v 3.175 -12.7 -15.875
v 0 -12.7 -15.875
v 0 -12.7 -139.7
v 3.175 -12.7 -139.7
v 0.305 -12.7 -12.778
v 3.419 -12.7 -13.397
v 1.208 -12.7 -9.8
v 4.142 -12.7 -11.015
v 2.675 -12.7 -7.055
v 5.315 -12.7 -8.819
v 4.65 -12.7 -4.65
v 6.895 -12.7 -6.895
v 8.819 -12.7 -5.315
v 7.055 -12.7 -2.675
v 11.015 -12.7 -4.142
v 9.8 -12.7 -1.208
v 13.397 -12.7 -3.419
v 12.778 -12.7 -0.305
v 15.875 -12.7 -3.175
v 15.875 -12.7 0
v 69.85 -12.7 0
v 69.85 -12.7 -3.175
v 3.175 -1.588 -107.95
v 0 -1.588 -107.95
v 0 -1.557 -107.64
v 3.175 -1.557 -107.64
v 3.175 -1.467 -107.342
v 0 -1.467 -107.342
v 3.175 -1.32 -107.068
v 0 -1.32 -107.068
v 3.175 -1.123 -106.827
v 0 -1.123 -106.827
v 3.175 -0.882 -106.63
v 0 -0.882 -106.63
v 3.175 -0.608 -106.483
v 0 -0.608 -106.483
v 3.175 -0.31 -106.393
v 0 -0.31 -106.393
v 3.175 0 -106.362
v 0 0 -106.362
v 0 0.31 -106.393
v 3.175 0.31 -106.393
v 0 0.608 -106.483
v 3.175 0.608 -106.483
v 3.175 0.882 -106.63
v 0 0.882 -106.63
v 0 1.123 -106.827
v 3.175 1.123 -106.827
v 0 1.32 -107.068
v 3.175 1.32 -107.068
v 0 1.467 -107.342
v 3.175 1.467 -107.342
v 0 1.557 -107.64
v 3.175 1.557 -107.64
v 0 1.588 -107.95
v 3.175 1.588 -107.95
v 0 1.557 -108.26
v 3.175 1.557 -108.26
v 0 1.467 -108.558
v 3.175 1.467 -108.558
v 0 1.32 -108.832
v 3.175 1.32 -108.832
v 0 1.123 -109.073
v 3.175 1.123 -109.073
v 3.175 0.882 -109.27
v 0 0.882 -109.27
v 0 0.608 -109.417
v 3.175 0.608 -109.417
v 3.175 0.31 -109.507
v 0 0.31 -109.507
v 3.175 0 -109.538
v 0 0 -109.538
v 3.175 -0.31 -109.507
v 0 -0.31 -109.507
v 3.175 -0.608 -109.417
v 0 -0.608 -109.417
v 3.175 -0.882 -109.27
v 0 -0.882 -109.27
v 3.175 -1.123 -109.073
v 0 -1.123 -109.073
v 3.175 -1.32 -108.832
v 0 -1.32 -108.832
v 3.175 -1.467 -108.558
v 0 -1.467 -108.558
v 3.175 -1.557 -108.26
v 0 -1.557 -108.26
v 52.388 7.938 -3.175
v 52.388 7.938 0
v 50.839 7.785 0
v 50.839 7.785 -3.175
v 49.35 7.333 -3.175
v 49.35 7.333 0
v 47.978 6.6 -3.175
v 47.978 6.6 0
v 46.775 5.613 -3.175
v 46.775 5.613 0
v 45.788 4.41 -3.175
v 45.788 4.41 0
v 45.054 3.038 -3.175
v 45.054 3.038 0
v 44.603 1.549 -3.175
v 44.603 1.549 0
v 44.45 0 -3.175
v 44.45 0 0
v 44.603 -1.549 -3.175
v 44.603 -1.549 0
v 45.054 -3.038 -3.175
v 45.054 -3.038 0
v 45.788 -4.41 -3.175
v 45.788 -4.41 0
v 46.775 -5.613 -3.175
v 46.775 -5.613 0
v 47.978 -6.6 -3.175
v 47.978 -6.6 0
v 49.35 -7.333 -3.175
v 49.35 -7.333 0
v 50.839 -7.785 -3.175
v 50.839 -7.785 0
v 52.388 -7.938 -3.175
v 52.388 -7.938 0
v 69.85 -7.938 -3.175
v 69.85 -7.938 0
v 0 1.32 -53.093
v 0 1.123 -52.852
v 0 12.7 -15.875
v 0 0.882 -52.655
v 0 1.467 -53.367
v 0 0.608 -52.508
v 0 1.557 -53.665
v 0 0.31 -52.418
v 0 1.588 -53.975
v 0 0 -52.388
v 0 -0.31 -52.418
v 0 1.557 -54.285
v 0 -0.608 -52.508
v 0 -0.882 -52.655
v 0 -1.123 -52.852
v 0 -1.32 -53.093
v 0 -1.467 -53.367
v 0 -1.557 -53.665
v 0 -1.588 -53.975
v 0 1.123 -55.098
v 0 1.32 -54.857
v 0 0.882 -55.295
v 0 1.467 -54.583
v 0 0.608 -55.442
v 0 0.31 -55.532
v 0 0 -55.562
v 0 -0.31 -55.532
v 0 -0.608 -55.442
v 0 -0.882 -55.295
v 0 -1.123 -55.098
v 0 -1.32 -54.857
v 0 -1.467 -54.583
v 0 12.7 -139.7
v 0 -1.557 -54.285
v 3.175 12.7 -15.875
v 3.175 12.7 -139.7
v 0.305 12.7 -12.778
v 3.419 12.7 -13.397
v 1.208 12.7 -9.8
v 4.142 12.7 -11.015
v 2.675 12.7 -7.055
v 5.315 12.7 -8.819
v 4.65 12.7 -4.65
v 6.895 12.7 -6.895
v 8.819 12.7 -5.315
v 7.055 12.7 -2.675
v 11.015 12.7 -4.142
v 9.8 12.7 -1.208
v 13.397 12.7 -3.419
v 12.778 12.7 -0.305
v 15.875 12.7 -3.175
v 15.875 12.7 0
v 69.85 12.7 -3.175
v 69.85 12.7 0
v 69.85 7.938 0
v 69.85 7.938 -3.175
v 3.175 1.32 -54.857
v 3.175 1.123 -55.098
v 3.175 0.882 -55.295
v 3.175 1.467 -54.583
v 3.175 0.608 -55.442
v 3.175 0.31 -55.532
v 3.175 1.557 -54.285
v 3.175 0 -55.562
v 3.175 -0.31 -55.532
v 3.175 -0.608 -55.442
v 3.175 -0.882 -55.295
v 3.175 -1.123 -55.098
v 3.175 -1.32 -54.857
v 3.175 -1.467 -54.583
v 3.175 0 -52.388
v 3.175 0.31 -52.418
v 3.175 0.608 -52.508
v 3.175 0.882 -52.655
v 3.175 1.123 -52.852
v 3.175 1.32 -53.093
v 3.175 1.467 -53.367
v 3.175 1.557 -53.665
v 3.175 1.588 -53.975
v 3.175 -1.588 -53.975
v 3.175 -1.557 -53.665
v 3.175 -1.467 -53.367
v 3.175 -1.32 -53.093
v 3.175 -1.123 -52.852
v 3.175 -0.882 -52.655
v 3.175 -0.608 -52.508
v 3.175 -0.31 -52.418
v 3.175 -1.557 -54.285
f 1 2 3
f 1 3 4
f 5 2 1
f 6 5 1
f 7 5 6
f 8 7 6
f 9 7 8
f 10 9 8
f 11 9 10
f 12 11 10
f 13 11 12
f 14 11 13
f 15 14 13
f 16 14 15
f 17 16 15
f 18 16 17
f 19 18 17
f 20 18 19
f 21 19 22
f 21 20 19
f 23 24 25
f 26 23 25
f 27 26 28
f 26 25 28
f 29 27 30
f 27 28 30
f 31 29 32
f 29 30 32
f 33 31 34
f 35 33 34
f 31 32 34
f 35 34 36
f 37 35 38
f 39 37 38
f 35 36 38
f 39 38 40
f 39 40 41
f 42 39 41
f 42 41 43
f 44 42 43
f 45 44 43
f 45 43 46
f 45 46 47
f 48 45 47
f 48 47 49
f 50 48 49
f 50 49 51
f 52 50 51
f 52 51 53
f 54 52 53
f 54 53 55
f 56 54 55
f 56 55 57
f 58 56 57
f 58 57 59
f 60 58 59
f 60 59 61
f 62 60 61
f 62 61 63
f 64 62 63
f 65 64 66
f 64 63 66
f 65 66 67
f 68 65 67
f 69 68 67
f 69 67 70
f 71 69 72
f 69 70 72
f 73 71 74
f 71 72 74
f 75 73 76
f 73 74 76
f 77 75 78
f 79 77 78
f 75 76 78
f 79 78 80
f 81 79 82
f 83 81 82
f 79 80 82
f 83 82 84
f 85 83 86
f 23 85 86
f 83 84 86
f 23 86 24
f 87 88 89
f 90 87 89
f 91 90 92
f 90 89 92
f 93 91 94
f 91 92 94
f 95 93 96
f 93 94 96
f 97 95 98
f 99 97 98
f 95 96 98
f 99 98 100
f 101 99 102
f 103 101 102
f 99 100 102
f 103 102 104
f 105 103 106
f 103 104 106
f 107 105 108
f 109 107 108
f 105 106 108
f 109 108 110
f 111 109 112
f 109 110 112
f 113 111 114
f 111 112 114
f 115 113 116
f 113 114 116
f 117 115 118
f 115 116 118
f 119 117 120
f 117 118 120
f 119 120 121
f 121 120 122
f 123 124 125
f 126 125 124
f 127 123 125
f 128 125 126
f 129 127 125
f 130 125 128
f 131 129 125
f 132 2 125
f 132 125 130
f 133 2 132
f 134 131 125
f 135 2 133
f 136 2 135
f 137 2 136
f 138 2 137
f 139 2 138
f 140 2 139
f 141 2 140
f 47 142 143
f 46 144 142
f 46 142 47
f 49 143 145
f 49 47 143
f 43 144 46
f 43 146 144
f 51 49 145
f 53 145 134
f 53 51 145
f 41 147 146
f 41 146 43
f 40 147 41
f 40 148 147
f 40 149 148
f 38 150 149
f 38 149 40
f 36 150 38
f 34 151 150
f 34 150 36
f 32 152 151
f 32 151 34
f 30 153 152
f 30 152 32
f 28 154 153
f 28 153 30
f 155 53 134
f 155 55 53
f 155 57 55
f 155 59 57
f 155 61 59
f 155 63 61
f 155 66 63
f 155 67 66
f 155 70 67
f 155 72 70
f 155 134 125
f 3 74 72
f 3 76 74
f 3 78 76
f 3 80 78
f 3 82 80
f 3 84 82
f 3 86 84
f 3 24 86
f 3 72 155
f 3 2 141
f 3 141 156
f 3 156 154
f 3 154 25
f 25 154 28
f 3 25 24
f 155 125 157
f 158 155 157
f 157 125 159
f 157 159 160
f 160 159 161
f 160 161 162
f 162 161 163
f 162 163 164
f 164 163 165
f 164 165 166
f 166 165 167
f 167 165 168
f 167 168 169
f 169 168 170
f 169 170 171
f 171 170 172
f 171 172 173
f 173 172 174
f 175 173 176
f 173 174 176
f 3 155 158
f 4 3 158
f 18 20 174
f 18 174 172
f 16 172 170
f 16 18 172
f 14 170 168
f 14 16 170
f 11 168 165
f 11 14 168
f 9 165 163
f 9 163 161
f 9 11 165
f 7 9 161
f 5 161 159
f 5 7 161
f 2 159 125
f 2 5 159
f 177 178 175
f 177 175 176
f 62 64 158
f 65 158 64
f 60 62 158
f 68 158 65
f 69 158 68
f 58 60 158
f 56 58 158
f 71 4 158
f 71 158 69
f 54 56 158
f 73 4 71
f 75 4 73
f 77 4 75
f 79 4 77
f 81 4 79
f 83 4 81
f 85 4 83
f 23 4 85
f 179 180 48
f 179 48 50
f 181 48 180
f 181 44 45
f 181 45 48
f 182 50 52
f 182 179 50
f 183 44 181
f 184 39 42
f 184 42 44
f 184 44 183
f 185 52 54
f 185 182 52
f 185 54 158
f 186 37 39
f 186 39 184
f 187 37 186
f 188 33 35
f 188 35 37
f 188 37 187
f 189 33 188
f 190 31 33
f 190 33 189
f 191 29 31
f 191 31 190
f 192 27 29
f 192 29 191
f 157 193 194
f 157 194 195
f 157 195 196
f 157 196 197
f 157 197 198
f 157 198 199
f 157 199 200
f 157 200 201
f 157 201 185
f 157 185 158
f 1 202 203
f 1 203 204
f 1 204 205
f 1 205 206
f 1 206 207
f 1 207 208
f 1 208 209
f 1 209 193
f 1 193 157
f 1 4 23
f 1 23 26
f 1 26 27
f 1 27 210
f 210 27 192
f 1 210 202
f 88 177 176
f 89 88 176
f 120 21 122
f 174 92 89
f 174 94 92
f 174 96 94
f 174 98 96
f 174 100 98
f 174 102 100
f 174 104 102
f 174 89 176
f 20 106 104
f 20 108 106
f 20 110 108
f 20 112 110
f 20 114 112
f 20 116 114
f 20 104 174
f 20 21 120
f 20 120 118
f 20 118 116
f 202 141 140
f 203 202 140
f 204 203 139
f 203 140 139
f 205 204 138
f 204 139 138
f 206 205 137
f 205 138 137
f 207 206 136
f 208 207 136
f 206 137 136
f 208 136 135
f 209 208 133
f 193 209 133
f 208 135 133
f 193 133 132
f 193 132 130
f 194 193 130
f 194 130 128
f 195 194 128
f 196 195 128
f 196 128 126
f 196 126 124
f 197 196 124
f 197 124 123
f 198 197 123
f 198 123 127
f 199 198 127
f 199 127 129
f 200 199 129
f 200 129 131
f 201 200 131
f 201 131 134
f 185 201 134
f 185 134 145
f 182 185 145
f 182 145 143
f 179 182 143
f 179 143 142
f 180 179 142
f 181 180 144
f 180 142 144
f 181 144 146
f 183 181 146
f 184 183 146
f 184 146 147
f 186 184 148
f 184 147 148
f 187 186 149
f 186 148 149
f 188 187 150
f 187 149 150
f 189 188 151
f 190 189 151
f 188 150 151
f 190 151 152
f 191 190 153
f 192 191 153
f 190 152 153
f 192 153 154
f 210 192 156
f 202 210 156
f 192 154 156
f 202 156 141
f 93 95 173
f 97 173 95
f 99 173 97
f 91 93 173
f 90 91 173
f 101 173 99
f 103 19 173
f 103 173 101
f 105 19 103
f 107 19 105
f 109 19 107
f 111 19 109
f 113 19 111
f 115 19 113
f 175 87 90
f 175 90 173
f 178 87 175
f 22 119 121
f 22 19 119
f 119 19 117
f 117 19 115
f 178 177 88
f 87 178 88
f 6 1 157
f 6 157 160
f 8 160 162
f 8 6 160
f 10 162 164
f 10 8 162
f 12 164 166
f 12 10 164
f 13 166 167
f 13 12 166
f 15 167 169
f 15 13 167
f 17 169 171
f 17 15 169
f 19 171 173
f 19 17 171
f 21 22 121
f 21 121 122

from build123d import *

# Parameters (mm, degrees)
F1_DEPTH = 12.7
F3_DEPTH = 25.4
F4_R     = 1.5875
F5_DEPTH = 25.4


with BuildPart() as f1:
    # F0 (on Front) → F1 (new body, symmetric)
    with BuildSketch(Plane.XZ):
        with BuildLine():
            Line((69.85, 0), (15.875, 0))
            ThreePointArc((15.875, 0), (4.64968, -4.64968), (0, -15.875))
            Line((0, -15.875), (0, -139.7))
            Line((0, -139.7), (3.175, -139.7))
            Line((3.175, -139.7), (3.175, -15.875))
            ThreePointArc((3.175, -15.875), (6.894744, -6.894744), (15.875, -3.175))
            Line((15.875, -3.175), (69.85, -3.175))
            Line((69.85, -3.175), (69.85, 0))
        make_face()
    extrude(amount=F1_DEPTH, both=True)

    # F2 (on face) → F3 (cut)
    with BuildSketch(Plane.XY):
        with BuildLine():
            ThreePointArc((52.3875, -7.9375), (58.00016, -5.61266), (60.325, 0))
            ThreePointArc((60.325, 0), (58.00016, 5.61266), (52.3875, 7.9375))
            ThreePointArc((52.3875, 7.9375), (44.45, 0), (52.3875, -7.9375))
        make_face()
        with BuildLine():
            ThreePointArc((52.3875, 7.9375), (58.00016, 5.61266), (60.325, 0))
            ThreePointArc((60.325, 0), (58.00016, -5.61266), (52.3875, -7.9375))
            Line((52.3875, -7.9375), (69.85, -7.9375))
            Line((69.85, -7.9375), (69.85, 7.9375))
            Line((69.85, 7.9375), (52.3875, 7.9375))
        make_face()
    extrude(amount=-F3_DEPTH, mode=Mode.SUBTRACT)

    # F4 (on face) → F5 (cut)
    with BuildSketch(Plane(origin=(0, 0, 0), x_dir=(0, -1, 0), z_dir=(-1, 0, 0))):
        with Locations((0, -53.975)):
            Circle(F4_R)
        with Locations((0, -107.95)):
            Circle(F4_R)
    extrude(amount=-F5_DEPTH, mode=Mode.SUBTRACT)


solid = f1.part
